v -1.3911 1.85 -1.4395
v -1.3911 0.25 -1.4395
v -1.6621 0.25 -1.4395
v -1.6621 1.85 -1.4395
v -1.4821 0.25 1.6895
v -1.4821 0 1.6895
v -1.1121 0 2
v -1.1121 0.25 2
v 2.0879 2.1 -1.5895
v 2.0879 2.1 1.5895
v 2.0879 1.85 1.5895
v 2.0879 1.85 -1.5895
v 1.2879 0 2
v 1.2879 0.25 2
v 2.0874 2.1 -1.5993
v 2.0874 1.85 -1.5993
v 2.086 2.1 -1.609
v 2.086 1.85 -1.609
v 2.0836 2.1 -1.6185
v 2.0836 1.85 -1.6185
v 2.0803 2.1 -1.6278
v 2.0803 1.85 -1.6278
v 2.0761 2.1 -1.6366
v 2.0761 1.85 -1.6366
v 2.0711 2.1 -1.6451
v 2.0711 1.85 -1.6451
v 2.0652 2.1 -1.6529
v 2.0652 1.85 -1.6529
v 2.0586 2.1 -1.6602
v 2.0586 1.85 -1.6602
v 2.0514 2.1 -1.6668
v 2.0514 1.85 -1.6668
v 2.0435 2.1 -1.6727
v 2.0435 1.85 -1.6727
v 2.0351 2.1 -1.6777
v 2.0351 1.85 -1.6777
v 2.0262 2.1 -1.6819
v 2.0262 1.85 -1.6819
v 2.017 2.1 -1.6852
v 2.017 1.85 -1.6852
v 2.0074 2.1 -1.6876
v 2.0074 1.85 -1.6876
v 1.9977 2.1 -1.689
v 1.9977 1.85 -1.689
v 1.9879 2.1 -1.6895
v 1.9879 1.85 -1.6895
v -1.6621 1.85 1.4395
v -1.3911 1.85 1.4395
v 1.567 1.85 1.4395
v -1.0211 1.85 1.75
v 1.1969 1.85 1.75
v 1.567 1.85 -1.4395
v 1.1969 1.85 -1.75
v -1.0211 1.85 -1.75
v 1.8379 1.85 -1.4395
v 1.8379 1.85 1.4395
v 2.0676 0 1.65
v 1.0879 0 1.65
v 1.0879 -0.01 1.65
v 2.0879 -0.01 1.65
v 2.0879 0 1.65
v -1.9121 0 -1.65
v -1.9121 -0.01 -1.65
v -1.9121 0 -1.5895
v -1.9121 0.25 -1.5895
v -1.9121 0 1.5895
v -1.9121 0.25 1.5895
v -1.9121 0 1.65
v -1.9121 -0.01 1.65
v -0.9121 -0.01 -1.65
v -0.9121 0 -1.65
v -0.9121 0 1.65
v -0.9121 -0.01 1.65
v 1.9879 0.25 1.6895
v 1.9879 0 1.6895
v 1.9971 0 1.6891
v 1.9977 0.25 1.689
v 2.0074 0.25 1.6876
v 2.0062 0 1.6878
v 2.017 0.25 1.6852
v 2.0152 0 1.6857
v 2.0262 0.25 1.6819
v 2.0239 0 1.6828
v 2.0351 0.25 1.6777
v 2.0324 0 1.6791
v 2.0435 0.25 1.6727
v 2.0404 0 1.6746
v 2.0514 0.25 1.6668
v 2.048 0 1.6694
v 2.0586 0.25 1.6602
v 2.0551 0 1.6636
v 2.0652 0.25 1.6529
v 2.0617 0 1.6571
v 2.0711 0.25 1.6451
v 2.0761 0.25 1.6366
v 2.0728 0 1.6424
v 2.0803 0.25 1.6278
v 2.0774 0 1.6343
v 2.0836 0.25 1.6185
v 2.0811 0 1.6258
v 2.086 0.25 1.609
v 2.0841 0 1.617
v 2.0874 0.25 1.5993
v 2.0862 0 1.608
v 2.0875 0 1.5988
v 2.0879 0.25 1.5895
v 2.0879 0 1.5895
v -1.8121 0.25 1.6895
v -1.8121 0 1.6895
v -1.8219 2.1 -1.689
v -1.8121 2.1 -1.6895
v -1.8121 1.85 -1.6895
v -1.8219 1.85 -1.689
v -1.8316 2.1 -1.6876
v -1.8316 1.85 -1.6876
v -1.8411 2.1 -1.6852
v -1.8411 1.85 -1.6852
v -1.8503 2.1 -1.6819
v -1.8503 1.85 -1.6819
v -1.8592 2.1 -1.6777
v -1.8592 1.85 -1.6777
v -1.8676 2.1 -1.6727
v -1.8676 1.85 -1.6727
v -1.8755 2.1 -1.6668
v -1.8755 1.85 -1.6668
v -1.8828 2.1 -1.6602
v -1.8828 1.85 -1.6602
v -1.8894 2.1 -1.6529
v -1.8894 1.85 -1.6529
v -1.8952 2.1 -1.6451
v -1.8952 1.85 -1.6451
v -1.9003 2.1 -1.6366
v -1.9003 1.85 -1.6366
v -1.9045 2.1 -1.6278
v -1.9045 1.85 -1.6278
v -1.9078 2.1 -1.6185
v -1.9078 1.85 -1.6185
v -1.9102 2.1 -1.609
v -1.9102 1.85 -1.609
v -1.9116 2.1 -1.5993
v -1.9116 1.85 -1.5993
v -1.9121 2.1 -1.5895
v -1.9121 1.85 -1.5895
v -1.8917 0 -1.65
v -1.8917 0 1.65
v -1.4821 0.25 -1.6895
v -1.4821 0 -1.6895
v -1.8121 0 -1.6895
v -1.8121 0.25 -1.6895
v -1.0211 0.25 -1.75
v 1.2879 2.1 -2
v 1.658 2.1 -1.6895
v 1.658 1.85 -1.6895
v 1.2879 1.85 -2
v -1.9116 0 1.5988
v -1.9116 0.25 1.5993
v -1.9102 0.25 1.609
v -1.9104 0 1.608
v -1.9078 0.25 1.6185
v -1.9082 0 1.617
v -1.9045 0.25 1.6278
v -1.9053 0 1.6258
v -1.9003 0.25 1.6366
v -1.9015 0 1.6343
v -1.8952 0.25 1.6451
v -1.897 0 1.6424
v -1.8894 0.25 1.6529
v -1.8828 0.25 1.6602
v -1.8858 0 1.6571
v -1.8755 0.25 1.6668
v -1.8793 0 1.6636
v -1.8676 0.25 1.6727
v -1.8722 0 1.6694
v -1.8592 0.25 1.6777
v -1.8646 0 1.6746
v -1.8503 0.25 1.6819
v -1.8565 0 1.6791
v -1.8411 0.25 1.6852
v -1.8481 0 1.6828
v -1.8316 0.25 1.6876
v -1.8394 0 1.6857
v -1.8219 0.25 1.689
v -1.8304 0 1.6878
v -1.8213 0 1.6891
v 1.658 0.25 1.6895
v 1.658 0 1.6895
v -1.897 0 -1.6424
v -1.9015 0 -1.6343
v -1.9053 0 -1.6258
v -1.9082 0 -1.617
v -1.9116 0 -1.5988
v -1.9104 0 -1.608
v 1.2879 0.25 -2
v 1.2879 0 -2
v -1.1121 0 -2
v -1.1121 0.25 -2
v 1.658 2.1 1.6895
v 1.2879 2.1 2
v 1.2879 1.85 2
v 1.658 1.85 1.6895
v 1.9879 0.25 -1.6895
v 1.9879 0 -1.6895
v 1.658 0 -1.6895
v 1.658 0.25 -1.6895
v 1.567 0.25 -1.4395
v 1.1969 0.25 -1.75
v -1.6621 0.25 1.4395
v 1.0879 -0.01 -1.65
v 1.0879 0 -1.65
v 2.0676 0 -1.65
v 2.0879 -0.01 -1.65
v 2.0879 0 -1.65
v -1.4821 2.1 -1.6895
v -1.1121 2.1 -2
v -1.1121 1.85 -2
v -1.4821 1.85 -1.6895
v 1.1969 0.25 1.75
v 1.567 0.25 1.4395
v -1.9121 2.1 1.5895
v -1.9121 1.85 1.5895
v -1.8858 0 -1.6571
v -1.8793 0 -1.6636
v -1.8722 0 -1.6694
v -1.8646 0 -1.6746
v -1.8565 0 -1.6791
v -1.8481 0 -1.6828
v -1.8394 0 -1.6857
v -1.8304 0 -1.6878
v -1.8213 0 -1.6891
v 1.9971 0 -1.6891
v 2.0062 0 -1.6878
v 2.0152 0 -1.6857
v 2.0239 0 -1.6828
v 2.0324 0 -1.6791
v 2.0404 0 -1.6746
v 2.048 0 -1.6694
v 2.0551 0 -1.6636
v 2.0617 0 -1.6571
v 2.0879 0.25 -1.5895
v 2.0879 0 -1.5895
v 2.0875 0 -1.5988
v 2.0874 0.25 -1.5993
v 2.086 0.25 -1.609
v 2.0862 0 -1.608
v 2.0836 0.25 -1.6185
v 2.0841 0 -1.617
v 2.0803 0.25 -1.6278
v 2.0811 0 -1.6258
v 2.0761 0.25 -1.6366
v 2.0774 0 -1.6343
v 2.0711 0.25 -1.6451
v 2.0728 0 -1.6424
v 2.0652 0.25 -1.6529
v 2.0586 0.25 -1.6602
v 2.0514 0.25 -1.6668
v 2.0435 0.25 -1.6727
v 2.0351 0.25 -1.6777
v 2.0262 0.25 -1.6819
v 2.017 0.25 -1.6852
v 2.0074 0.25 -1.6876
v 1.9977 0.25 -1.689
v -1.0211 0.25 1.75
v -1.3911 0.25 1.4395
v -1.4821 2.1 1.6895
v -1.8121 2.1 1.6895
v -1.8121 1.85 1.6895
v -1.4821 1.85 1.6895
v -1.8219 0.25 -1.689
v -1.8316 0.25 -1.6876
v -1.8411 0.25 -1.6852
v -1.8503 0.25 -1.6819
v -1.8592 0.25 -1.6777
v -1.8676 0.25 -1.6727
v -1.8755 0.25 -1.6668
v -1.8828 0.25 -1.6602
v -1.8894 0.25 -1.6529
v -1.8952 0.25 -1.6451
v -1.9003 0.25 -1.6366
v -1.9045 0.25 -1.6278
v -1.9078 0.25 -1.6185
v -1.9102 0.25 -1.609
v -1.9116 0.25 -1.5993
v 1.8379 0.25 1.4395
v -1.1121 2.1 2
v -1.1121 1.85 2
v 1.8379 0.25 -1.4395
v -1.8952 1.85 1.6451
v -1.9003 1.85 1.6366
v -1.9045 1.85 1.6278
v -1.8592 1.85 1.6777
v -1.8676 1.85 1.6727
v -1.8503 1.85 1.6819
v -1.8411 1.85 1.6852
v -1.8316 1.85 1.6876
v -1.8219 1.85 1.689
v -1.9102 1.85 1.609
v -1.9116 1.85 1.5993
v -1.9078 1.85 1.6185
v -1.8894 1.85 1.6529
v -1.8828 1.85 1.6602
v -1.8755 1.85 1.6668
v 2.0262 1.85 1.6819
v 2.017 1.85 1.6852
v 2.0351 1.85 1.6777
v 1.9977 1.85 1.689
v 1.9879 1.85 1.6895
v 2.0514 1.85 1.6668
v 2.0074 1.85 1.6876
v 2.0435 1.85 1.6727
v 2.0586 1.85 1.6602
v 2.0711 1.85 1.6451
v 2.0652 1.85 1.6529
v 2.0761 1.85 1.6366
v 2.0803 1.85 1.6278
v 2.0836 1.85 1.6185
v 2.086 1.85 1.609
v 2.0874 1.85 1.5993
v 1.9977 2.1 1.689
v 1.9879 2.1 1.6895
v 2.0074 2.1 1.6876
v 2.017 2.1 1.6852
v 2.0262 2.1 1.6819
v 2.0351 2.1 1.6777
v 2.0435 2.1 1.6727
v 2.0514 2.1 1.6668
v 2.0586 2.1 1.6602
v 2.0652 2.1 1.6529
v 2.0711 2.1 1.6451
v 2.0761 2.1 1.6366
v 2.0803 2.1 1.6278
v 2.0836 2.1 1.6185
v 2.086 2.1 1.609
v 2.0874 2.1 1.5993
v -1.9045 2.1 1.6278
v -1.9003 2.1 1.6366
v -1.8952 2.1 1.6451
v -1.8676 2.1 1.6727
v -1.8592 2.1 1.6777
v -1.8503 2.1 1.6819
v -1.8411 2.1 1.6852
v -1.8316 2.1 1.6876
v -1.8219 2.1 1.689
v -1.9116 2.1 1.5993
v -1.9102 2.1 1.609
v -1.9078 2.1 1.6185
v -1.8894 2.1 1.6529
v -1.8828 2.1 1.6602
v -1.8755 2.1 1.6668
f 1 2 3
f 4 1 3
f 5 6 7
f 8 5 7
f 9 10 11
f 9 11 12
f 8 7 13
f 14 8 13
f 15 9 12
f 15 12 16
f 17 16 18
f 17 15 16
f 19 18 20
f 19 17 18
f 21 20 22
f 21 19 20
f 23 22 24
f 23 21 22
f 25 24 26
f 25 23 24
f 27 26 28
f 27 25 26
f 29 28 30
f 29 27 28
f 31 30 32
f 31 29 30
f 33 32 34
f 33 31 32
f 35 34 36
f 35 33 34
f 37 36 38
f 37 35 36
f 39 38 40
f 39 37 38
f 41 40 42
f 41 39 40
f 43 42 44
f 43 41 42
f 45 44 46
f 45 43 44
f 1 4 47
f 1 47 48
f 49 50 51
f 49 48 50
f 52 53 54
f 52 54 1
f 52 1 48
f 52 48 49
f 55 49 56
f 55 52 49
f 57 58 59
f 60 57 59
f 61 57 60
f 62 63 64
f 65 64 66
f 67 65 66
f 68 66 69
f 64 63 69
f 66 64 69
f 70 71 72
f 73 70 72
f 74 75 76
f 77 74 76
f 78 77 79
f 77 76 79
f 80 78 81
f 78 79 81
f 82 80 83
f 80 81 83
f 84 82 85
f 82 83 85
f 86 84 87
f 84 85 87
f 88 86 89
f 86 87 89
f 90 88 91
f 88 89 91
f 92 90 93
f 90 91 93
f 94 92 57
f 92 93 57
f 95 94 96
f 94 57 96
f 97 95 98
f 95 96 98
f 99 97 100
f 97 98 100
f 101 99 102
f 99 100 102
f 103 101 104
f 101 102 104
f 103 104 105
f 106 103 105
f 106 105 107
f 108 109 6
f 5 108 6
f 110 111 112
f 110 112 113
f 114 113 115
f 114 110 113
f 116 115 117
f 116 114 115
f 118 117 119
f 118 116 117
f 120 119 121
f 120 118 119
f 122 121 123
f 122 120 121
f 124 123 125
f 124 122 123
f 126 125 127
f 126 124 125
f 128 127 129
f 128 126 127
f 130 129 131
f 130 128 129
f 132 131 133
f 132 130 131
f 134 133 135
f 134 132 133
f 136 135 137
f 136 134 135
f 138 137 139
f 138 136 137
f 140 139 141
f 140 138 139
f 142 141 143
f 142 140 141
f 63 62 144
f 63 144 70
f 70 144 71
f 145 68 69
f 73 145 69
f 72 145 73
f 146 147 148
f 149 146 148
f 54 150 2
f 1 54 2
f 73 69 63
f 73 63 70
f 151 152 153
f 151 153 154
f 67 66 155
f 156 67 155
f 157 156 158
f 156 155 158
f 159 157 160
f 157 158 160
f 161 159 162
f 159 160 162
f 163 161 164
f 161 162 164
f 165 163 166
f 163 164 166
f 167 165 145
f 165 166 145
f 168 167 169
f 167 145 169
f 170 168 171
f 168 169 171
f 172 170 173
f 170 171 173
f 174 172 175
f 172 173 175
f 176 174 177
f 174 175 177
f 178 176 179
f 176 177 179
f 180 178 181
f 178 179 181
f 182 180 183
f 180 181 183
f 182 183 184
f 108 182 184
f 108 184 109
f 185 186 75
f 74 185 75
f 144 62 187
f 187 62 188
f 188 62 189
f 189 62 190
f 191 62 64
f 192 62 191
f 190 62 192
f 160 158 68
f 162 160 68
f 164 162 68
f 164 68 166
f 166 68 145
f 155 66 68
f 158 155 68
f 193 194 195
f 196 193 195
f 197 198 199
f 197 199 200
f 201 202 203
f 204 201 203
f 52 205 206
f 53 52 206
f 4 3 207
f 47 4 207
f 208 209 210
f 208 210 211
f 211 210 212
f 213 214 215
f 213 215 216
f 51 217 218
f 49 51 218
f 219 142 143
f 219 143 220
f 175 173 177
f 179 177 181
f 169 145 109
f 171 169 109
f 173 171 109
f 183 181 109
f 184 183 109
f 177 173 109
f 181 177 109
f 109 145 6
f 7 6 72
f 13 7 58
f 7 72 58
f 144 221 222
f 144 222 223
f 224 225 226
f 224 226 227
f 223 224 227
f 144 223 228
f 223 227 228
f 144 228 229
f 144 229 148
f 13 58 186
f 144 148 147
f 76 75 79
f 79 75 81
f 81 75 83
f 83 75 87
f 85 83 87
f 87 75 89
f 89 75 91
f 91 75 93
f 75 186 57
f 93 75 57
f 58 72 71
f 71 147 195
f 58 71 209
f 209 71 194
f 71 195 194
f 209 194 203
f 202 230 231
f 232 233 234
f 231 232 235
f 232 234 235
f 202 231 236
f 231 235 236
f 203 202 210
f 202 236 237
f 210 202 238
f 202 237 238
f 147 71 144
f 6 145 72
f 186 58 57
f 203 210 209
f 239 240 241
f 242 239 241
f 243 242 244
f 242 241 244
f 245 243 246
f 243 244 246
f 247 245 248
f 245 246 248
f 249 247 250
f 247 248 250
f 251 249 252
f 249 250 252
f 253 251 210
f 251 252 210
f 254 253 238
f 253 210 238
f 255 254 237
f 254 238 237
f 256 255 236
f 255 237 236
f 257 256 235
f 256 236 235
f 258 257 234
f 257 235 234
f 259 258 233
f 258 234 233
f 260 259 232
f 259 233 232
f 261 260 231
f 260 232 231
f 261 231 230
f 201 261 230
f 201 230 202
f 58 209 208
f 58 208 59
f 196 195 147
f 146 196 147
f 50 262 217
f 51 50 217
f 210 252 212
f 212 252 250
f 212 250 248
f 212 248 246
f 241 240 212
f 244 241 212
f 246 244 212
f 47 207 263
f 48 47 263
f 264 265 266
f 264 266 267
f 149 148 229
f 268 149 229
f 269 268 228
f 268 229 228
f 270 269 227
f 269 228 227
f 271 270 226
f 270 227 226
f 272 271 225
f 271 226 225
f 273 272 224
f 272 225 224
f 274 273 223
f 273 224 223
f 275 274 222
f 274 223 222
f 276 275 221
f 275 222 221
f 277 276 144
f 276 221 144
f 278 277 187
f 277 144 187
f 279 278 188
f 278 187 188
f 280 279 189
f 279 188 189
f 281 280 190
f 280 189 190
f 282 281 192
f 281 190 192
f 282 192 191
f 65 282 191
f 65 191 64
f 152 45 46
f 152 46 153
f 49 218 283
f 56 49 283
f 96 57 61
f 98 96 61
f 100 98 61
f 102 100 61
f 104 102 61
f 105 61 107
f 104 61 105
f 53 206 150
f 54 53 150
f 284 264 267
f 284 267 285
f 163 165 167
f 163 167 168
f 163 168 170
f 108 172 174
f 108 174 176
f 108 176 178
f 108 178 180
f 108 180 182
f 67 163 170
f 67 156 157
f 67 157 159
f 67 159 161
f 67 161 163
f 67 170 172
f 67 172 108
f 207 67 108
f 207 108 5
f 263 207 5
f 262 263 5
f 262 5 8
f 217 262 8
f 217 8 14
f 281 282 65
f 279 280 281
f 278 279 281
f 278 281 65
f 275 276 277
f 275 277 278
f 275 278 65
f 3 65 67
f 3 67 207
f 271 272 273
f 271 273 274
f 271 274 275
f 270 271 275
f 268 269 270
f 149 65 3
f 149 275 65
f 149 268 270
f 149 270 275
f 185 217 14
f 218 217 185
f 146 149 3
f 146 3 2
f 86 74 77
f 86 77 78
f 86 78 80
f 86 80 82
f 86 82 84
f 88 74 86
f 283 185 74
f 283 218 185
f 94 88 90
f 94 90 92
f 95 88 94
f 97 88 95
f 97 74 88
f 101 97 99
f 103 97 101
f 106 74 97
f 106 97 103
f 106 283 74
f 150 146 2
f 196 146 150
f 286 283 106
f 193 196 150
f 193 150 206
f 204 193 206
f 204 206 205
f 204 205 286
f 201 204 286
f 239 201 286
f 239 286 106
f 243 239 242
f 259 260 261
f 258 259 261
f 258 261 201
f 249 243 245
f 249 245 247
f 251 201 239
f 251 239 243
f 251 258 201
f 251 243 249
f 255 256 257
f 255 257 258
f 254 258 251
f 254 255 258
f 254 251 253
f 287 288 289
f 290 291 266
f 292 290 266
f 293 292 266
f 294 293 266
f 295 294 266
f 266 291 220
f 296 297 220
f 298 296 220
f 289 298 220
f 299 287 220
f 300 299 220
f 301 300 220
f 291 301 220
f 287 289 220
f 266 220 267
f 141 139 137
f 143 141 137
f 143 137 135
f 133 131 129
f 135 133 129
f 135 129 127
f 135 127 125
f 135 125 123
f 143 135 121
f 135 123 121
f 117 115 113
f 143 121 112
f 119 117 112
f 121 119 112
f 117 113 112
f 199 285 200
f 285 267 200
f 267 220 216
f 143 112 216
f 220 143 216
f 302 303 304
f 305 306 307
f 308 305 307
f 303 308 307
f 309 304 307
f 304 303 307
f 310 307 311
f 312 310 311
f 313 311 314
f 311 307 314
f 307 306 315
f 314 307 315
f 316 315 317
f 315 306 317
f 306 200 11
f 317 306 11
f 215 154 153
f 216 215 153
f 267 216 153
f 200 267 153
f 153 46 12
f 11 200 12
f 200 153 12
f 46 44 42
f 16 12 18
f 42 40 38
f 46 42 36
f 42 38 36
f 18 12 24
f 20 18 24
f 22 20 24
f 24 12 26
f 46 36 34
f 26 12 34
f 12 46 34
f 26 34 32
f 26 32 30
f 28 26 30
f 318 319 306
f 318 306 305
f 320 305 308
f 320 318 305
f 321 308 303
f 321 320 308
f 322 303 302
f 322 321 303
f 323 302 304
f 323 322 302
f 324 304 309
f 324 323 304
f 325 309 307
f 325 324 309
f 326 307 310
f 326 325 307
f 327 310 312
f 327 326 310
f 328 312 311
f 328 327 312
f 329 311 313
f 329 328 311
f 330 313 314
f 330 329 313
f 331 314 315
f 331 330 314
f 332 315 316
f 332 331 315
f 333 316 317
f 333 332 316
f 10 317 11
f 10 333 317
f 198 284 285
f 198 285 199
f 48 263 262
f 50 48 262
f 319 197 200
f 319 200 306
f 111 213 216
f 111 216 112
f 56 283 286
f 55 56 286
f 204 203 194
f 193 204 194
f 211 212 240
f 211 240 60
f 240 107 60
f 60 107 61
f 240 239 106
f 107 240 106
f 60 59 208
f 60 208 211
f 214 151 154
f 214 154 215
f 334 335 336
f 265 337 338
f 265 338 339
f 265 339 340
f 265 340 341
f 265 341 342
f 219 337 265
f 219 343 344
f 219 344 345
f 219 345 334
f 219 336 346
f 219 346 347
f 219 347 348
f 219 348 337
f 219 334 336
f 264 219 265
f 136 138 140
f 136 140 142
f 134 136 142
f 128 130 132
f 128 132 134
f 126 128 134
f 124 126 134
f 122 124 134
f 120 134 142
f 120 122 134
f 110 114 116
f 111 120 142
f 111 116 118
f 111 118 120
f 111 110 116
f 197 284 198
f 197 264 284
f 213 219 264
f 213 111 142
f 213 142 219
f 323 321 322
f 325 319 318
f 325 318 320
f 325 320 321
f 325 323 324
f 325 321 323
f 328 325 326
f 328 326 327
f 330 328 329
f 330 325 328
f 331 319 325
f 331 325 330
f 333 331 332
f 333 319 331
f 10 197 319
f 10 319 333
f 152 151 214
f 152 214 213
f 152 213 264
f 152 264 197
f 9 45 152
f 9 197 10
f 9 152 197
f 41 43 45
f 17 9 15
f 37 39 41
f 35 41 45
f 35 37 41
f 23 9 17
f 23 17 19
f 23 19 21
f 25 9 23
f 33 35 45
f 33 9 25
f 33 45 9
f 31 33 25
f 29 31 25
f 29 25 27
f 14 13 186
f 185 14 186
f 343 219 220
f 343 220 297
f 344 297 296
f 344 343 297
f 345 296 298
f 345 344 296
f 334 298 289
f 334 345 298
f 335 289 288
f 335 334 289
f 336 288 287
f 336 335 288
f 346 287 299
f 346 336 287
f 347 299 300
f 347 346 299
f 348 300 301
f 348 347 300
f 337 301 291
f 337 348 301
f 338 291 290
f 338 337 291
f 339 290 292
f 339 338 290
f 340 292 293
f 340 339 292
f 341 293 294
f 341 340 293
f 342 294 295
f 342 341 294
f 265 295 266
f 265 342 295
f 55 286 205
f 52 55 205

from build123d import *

# Parameters (mm, degrees)
SALIENTE_EXTRUIR1_DEPTH = 0.25
SALIENTE_EXTRUIR3_DEPTH = 1.6
SALIENTE_EXTRUIR2_DEPTH = 0.25
CROQUIS4_W              = 1
CROQUIS4_H              = 3.3
SALIENTE_EXTRUIR4_DEPTH = 0.01


with BuildPart() as part:
    # Croquis1 → Saliente-Extruir1 (new body)
    with BuildSketch(Plane(origin=(0, 0, 0), x_dir=(1, 0, 0), z_dir=(0, 1, 0))):
        with BuildLine():
            Line((1.287926846, 2), (-1.112073154, 2))
            Line((-1.112073154, 2), (-1.482101523, 1.689509332))
            Line((-1.482101523, 1.689509332), (-1.812073154, 1.689509332))
            ThreePointArc((-1.812073154, 1.689509332), (-1.882783832, 1.66022001), (-1.912073154, 1.589509332))
            Line((-1.912073154, 1.589509332), (-1.912073154, -1.589509332))
            ThreePointArc((-1.912073154, -1.589509332), (-1.882783832, -1.66022001), (-1.812073154, -1.689509332))
            Line((-1.812073154, -1.689509332), (-1.482101523, -1.689509332))
            Line((-1.482101523, -1.689509332), (-1.112073154, -2))
            Line((-1.112073154, -2), (1.287926846, -2))
            Line((1.287926846, -2), (1.657955215, -1.689509332))
            Line((1.657955215, -1.689509332), (1.987926846, -1.689509332))
            ThreePointArc((1.987926846, -1.689509332), (2.058637524, -1.66022001), (2.087926846, -1.589509332))
            Line((2.087926846, -1.589509332), (2.087926846, 1.589509332))
            ThreePointArc((2.087926846, 1.589509332), (2.058637524, 1.66022001), (1.987926846, 1.689509332))
            Line((1.987926846, 1.689509332), (1.657955215, 1.689509332))
            Line((1.657955215, 1.689509332), (1.287926846, 2))
        make_face()
    extrude(amount=SALIENTE_EXTRUIR1_DEPTH)

    # Croquis3 → Saliente-Extruir3 (add)
    with BuildSketch(Plane(origin=(0, 0.25, 0), x_dir=(1, 0, 0), z_dir=(0, 1, 0))):
        Polygon((-1.021080595, -1.75), (1.196934287, -1.75), (1.566962656, -1.439509332), (1.837926846, -1.439509332), (1.837926846, 1.439509332), (1.566962656, 1.439509332), (1.196934287, 1.75), (-1.021080595, 1.75), (-1.391108964, 1.439509332), (-1.662073154, 1.439509332), (-1.662073154, -1.439509332), (-1.391108964, -1.439509332), align=None)
    extrude(amount=SALIENTE_EXTRUIR3_DEPTH)

    # Croquis4 → Saliente-Extruir4 (add)
    with BuildSketch(Plane.XZ):
        with Locations((1.587926846, 0)):
            Rectangle(CROQUIS4_W, CROQUIS4_H)
        with Locations((-1.412073154, 0)):
            Rectangle(CROQUIS4_W, CROQUIS4_H)
    extrude(amount=SALIENTE_EXTRUIR4_DEPTH)


with BuildPart() as body_2:
    # Croquis2 → Saliente-Extruir2 (new body)
    with BuildSketch(Plane(origin=(0, 2.1, 0), x_dir=(1, 0, 0), z_dir=(0, 1, 0))):
        with BuildLine():
            Line((-1.112073154, -2), (1.287926846, -2))
            Line((1.287926846, -2), (1.657955215, -1.689509332))
            Line((1.657955215, -1.689509332), (1.987926846, -1.689509332))
            ThreePointArc((1.987926846, -1.689509332), (2.058637524, -1.66022001), (2.087926846, -1.589509332))
            Line((2.087926846, -1.589509332), (2.087926846, 1.589509332))
            ThreePointArc((2.087926846, 1.589509332), (2.058637524, 1.66022001), (1.987926846, 1.689509332))
            Line((1.987926846, 1.689509332), (1.657955215, 1.689509332))
            Line((1.657955215, 1.689509332), (1.287926846, 2))
            Line((1.287926846, 2), (-1.112073154, 2))
            Line((-1.112073154, 2), (-1.482101523, 1.689509332))
            Line((-1.482101523, 1.689509332), (-1.812073154, 1.689509332))
            ThreePointArc((-1.812073154, 1.689509332), (-1.882783832, 1.66022001), (-1.912073154, 1.589509332))
            Line((-1.912073154, 1.589509332), (-1.912073154, -1.589509332))
            ThreePointArc((-1.912073154, -1.589509332), (-1.882783832, -1.66022001), (-1.812073154, -1.689509332))
            Line((-1.812073154, -1.689509332), (-1.482101523, -1.689509332))
            Line((-1.482101523, -1.689509332), (-1.112073154, -2))
        make_face()
    extrude(amount=-SALIENTE_EXTRUIR2_DEPTH)


solid = Compound([part.part, body_2.part])
